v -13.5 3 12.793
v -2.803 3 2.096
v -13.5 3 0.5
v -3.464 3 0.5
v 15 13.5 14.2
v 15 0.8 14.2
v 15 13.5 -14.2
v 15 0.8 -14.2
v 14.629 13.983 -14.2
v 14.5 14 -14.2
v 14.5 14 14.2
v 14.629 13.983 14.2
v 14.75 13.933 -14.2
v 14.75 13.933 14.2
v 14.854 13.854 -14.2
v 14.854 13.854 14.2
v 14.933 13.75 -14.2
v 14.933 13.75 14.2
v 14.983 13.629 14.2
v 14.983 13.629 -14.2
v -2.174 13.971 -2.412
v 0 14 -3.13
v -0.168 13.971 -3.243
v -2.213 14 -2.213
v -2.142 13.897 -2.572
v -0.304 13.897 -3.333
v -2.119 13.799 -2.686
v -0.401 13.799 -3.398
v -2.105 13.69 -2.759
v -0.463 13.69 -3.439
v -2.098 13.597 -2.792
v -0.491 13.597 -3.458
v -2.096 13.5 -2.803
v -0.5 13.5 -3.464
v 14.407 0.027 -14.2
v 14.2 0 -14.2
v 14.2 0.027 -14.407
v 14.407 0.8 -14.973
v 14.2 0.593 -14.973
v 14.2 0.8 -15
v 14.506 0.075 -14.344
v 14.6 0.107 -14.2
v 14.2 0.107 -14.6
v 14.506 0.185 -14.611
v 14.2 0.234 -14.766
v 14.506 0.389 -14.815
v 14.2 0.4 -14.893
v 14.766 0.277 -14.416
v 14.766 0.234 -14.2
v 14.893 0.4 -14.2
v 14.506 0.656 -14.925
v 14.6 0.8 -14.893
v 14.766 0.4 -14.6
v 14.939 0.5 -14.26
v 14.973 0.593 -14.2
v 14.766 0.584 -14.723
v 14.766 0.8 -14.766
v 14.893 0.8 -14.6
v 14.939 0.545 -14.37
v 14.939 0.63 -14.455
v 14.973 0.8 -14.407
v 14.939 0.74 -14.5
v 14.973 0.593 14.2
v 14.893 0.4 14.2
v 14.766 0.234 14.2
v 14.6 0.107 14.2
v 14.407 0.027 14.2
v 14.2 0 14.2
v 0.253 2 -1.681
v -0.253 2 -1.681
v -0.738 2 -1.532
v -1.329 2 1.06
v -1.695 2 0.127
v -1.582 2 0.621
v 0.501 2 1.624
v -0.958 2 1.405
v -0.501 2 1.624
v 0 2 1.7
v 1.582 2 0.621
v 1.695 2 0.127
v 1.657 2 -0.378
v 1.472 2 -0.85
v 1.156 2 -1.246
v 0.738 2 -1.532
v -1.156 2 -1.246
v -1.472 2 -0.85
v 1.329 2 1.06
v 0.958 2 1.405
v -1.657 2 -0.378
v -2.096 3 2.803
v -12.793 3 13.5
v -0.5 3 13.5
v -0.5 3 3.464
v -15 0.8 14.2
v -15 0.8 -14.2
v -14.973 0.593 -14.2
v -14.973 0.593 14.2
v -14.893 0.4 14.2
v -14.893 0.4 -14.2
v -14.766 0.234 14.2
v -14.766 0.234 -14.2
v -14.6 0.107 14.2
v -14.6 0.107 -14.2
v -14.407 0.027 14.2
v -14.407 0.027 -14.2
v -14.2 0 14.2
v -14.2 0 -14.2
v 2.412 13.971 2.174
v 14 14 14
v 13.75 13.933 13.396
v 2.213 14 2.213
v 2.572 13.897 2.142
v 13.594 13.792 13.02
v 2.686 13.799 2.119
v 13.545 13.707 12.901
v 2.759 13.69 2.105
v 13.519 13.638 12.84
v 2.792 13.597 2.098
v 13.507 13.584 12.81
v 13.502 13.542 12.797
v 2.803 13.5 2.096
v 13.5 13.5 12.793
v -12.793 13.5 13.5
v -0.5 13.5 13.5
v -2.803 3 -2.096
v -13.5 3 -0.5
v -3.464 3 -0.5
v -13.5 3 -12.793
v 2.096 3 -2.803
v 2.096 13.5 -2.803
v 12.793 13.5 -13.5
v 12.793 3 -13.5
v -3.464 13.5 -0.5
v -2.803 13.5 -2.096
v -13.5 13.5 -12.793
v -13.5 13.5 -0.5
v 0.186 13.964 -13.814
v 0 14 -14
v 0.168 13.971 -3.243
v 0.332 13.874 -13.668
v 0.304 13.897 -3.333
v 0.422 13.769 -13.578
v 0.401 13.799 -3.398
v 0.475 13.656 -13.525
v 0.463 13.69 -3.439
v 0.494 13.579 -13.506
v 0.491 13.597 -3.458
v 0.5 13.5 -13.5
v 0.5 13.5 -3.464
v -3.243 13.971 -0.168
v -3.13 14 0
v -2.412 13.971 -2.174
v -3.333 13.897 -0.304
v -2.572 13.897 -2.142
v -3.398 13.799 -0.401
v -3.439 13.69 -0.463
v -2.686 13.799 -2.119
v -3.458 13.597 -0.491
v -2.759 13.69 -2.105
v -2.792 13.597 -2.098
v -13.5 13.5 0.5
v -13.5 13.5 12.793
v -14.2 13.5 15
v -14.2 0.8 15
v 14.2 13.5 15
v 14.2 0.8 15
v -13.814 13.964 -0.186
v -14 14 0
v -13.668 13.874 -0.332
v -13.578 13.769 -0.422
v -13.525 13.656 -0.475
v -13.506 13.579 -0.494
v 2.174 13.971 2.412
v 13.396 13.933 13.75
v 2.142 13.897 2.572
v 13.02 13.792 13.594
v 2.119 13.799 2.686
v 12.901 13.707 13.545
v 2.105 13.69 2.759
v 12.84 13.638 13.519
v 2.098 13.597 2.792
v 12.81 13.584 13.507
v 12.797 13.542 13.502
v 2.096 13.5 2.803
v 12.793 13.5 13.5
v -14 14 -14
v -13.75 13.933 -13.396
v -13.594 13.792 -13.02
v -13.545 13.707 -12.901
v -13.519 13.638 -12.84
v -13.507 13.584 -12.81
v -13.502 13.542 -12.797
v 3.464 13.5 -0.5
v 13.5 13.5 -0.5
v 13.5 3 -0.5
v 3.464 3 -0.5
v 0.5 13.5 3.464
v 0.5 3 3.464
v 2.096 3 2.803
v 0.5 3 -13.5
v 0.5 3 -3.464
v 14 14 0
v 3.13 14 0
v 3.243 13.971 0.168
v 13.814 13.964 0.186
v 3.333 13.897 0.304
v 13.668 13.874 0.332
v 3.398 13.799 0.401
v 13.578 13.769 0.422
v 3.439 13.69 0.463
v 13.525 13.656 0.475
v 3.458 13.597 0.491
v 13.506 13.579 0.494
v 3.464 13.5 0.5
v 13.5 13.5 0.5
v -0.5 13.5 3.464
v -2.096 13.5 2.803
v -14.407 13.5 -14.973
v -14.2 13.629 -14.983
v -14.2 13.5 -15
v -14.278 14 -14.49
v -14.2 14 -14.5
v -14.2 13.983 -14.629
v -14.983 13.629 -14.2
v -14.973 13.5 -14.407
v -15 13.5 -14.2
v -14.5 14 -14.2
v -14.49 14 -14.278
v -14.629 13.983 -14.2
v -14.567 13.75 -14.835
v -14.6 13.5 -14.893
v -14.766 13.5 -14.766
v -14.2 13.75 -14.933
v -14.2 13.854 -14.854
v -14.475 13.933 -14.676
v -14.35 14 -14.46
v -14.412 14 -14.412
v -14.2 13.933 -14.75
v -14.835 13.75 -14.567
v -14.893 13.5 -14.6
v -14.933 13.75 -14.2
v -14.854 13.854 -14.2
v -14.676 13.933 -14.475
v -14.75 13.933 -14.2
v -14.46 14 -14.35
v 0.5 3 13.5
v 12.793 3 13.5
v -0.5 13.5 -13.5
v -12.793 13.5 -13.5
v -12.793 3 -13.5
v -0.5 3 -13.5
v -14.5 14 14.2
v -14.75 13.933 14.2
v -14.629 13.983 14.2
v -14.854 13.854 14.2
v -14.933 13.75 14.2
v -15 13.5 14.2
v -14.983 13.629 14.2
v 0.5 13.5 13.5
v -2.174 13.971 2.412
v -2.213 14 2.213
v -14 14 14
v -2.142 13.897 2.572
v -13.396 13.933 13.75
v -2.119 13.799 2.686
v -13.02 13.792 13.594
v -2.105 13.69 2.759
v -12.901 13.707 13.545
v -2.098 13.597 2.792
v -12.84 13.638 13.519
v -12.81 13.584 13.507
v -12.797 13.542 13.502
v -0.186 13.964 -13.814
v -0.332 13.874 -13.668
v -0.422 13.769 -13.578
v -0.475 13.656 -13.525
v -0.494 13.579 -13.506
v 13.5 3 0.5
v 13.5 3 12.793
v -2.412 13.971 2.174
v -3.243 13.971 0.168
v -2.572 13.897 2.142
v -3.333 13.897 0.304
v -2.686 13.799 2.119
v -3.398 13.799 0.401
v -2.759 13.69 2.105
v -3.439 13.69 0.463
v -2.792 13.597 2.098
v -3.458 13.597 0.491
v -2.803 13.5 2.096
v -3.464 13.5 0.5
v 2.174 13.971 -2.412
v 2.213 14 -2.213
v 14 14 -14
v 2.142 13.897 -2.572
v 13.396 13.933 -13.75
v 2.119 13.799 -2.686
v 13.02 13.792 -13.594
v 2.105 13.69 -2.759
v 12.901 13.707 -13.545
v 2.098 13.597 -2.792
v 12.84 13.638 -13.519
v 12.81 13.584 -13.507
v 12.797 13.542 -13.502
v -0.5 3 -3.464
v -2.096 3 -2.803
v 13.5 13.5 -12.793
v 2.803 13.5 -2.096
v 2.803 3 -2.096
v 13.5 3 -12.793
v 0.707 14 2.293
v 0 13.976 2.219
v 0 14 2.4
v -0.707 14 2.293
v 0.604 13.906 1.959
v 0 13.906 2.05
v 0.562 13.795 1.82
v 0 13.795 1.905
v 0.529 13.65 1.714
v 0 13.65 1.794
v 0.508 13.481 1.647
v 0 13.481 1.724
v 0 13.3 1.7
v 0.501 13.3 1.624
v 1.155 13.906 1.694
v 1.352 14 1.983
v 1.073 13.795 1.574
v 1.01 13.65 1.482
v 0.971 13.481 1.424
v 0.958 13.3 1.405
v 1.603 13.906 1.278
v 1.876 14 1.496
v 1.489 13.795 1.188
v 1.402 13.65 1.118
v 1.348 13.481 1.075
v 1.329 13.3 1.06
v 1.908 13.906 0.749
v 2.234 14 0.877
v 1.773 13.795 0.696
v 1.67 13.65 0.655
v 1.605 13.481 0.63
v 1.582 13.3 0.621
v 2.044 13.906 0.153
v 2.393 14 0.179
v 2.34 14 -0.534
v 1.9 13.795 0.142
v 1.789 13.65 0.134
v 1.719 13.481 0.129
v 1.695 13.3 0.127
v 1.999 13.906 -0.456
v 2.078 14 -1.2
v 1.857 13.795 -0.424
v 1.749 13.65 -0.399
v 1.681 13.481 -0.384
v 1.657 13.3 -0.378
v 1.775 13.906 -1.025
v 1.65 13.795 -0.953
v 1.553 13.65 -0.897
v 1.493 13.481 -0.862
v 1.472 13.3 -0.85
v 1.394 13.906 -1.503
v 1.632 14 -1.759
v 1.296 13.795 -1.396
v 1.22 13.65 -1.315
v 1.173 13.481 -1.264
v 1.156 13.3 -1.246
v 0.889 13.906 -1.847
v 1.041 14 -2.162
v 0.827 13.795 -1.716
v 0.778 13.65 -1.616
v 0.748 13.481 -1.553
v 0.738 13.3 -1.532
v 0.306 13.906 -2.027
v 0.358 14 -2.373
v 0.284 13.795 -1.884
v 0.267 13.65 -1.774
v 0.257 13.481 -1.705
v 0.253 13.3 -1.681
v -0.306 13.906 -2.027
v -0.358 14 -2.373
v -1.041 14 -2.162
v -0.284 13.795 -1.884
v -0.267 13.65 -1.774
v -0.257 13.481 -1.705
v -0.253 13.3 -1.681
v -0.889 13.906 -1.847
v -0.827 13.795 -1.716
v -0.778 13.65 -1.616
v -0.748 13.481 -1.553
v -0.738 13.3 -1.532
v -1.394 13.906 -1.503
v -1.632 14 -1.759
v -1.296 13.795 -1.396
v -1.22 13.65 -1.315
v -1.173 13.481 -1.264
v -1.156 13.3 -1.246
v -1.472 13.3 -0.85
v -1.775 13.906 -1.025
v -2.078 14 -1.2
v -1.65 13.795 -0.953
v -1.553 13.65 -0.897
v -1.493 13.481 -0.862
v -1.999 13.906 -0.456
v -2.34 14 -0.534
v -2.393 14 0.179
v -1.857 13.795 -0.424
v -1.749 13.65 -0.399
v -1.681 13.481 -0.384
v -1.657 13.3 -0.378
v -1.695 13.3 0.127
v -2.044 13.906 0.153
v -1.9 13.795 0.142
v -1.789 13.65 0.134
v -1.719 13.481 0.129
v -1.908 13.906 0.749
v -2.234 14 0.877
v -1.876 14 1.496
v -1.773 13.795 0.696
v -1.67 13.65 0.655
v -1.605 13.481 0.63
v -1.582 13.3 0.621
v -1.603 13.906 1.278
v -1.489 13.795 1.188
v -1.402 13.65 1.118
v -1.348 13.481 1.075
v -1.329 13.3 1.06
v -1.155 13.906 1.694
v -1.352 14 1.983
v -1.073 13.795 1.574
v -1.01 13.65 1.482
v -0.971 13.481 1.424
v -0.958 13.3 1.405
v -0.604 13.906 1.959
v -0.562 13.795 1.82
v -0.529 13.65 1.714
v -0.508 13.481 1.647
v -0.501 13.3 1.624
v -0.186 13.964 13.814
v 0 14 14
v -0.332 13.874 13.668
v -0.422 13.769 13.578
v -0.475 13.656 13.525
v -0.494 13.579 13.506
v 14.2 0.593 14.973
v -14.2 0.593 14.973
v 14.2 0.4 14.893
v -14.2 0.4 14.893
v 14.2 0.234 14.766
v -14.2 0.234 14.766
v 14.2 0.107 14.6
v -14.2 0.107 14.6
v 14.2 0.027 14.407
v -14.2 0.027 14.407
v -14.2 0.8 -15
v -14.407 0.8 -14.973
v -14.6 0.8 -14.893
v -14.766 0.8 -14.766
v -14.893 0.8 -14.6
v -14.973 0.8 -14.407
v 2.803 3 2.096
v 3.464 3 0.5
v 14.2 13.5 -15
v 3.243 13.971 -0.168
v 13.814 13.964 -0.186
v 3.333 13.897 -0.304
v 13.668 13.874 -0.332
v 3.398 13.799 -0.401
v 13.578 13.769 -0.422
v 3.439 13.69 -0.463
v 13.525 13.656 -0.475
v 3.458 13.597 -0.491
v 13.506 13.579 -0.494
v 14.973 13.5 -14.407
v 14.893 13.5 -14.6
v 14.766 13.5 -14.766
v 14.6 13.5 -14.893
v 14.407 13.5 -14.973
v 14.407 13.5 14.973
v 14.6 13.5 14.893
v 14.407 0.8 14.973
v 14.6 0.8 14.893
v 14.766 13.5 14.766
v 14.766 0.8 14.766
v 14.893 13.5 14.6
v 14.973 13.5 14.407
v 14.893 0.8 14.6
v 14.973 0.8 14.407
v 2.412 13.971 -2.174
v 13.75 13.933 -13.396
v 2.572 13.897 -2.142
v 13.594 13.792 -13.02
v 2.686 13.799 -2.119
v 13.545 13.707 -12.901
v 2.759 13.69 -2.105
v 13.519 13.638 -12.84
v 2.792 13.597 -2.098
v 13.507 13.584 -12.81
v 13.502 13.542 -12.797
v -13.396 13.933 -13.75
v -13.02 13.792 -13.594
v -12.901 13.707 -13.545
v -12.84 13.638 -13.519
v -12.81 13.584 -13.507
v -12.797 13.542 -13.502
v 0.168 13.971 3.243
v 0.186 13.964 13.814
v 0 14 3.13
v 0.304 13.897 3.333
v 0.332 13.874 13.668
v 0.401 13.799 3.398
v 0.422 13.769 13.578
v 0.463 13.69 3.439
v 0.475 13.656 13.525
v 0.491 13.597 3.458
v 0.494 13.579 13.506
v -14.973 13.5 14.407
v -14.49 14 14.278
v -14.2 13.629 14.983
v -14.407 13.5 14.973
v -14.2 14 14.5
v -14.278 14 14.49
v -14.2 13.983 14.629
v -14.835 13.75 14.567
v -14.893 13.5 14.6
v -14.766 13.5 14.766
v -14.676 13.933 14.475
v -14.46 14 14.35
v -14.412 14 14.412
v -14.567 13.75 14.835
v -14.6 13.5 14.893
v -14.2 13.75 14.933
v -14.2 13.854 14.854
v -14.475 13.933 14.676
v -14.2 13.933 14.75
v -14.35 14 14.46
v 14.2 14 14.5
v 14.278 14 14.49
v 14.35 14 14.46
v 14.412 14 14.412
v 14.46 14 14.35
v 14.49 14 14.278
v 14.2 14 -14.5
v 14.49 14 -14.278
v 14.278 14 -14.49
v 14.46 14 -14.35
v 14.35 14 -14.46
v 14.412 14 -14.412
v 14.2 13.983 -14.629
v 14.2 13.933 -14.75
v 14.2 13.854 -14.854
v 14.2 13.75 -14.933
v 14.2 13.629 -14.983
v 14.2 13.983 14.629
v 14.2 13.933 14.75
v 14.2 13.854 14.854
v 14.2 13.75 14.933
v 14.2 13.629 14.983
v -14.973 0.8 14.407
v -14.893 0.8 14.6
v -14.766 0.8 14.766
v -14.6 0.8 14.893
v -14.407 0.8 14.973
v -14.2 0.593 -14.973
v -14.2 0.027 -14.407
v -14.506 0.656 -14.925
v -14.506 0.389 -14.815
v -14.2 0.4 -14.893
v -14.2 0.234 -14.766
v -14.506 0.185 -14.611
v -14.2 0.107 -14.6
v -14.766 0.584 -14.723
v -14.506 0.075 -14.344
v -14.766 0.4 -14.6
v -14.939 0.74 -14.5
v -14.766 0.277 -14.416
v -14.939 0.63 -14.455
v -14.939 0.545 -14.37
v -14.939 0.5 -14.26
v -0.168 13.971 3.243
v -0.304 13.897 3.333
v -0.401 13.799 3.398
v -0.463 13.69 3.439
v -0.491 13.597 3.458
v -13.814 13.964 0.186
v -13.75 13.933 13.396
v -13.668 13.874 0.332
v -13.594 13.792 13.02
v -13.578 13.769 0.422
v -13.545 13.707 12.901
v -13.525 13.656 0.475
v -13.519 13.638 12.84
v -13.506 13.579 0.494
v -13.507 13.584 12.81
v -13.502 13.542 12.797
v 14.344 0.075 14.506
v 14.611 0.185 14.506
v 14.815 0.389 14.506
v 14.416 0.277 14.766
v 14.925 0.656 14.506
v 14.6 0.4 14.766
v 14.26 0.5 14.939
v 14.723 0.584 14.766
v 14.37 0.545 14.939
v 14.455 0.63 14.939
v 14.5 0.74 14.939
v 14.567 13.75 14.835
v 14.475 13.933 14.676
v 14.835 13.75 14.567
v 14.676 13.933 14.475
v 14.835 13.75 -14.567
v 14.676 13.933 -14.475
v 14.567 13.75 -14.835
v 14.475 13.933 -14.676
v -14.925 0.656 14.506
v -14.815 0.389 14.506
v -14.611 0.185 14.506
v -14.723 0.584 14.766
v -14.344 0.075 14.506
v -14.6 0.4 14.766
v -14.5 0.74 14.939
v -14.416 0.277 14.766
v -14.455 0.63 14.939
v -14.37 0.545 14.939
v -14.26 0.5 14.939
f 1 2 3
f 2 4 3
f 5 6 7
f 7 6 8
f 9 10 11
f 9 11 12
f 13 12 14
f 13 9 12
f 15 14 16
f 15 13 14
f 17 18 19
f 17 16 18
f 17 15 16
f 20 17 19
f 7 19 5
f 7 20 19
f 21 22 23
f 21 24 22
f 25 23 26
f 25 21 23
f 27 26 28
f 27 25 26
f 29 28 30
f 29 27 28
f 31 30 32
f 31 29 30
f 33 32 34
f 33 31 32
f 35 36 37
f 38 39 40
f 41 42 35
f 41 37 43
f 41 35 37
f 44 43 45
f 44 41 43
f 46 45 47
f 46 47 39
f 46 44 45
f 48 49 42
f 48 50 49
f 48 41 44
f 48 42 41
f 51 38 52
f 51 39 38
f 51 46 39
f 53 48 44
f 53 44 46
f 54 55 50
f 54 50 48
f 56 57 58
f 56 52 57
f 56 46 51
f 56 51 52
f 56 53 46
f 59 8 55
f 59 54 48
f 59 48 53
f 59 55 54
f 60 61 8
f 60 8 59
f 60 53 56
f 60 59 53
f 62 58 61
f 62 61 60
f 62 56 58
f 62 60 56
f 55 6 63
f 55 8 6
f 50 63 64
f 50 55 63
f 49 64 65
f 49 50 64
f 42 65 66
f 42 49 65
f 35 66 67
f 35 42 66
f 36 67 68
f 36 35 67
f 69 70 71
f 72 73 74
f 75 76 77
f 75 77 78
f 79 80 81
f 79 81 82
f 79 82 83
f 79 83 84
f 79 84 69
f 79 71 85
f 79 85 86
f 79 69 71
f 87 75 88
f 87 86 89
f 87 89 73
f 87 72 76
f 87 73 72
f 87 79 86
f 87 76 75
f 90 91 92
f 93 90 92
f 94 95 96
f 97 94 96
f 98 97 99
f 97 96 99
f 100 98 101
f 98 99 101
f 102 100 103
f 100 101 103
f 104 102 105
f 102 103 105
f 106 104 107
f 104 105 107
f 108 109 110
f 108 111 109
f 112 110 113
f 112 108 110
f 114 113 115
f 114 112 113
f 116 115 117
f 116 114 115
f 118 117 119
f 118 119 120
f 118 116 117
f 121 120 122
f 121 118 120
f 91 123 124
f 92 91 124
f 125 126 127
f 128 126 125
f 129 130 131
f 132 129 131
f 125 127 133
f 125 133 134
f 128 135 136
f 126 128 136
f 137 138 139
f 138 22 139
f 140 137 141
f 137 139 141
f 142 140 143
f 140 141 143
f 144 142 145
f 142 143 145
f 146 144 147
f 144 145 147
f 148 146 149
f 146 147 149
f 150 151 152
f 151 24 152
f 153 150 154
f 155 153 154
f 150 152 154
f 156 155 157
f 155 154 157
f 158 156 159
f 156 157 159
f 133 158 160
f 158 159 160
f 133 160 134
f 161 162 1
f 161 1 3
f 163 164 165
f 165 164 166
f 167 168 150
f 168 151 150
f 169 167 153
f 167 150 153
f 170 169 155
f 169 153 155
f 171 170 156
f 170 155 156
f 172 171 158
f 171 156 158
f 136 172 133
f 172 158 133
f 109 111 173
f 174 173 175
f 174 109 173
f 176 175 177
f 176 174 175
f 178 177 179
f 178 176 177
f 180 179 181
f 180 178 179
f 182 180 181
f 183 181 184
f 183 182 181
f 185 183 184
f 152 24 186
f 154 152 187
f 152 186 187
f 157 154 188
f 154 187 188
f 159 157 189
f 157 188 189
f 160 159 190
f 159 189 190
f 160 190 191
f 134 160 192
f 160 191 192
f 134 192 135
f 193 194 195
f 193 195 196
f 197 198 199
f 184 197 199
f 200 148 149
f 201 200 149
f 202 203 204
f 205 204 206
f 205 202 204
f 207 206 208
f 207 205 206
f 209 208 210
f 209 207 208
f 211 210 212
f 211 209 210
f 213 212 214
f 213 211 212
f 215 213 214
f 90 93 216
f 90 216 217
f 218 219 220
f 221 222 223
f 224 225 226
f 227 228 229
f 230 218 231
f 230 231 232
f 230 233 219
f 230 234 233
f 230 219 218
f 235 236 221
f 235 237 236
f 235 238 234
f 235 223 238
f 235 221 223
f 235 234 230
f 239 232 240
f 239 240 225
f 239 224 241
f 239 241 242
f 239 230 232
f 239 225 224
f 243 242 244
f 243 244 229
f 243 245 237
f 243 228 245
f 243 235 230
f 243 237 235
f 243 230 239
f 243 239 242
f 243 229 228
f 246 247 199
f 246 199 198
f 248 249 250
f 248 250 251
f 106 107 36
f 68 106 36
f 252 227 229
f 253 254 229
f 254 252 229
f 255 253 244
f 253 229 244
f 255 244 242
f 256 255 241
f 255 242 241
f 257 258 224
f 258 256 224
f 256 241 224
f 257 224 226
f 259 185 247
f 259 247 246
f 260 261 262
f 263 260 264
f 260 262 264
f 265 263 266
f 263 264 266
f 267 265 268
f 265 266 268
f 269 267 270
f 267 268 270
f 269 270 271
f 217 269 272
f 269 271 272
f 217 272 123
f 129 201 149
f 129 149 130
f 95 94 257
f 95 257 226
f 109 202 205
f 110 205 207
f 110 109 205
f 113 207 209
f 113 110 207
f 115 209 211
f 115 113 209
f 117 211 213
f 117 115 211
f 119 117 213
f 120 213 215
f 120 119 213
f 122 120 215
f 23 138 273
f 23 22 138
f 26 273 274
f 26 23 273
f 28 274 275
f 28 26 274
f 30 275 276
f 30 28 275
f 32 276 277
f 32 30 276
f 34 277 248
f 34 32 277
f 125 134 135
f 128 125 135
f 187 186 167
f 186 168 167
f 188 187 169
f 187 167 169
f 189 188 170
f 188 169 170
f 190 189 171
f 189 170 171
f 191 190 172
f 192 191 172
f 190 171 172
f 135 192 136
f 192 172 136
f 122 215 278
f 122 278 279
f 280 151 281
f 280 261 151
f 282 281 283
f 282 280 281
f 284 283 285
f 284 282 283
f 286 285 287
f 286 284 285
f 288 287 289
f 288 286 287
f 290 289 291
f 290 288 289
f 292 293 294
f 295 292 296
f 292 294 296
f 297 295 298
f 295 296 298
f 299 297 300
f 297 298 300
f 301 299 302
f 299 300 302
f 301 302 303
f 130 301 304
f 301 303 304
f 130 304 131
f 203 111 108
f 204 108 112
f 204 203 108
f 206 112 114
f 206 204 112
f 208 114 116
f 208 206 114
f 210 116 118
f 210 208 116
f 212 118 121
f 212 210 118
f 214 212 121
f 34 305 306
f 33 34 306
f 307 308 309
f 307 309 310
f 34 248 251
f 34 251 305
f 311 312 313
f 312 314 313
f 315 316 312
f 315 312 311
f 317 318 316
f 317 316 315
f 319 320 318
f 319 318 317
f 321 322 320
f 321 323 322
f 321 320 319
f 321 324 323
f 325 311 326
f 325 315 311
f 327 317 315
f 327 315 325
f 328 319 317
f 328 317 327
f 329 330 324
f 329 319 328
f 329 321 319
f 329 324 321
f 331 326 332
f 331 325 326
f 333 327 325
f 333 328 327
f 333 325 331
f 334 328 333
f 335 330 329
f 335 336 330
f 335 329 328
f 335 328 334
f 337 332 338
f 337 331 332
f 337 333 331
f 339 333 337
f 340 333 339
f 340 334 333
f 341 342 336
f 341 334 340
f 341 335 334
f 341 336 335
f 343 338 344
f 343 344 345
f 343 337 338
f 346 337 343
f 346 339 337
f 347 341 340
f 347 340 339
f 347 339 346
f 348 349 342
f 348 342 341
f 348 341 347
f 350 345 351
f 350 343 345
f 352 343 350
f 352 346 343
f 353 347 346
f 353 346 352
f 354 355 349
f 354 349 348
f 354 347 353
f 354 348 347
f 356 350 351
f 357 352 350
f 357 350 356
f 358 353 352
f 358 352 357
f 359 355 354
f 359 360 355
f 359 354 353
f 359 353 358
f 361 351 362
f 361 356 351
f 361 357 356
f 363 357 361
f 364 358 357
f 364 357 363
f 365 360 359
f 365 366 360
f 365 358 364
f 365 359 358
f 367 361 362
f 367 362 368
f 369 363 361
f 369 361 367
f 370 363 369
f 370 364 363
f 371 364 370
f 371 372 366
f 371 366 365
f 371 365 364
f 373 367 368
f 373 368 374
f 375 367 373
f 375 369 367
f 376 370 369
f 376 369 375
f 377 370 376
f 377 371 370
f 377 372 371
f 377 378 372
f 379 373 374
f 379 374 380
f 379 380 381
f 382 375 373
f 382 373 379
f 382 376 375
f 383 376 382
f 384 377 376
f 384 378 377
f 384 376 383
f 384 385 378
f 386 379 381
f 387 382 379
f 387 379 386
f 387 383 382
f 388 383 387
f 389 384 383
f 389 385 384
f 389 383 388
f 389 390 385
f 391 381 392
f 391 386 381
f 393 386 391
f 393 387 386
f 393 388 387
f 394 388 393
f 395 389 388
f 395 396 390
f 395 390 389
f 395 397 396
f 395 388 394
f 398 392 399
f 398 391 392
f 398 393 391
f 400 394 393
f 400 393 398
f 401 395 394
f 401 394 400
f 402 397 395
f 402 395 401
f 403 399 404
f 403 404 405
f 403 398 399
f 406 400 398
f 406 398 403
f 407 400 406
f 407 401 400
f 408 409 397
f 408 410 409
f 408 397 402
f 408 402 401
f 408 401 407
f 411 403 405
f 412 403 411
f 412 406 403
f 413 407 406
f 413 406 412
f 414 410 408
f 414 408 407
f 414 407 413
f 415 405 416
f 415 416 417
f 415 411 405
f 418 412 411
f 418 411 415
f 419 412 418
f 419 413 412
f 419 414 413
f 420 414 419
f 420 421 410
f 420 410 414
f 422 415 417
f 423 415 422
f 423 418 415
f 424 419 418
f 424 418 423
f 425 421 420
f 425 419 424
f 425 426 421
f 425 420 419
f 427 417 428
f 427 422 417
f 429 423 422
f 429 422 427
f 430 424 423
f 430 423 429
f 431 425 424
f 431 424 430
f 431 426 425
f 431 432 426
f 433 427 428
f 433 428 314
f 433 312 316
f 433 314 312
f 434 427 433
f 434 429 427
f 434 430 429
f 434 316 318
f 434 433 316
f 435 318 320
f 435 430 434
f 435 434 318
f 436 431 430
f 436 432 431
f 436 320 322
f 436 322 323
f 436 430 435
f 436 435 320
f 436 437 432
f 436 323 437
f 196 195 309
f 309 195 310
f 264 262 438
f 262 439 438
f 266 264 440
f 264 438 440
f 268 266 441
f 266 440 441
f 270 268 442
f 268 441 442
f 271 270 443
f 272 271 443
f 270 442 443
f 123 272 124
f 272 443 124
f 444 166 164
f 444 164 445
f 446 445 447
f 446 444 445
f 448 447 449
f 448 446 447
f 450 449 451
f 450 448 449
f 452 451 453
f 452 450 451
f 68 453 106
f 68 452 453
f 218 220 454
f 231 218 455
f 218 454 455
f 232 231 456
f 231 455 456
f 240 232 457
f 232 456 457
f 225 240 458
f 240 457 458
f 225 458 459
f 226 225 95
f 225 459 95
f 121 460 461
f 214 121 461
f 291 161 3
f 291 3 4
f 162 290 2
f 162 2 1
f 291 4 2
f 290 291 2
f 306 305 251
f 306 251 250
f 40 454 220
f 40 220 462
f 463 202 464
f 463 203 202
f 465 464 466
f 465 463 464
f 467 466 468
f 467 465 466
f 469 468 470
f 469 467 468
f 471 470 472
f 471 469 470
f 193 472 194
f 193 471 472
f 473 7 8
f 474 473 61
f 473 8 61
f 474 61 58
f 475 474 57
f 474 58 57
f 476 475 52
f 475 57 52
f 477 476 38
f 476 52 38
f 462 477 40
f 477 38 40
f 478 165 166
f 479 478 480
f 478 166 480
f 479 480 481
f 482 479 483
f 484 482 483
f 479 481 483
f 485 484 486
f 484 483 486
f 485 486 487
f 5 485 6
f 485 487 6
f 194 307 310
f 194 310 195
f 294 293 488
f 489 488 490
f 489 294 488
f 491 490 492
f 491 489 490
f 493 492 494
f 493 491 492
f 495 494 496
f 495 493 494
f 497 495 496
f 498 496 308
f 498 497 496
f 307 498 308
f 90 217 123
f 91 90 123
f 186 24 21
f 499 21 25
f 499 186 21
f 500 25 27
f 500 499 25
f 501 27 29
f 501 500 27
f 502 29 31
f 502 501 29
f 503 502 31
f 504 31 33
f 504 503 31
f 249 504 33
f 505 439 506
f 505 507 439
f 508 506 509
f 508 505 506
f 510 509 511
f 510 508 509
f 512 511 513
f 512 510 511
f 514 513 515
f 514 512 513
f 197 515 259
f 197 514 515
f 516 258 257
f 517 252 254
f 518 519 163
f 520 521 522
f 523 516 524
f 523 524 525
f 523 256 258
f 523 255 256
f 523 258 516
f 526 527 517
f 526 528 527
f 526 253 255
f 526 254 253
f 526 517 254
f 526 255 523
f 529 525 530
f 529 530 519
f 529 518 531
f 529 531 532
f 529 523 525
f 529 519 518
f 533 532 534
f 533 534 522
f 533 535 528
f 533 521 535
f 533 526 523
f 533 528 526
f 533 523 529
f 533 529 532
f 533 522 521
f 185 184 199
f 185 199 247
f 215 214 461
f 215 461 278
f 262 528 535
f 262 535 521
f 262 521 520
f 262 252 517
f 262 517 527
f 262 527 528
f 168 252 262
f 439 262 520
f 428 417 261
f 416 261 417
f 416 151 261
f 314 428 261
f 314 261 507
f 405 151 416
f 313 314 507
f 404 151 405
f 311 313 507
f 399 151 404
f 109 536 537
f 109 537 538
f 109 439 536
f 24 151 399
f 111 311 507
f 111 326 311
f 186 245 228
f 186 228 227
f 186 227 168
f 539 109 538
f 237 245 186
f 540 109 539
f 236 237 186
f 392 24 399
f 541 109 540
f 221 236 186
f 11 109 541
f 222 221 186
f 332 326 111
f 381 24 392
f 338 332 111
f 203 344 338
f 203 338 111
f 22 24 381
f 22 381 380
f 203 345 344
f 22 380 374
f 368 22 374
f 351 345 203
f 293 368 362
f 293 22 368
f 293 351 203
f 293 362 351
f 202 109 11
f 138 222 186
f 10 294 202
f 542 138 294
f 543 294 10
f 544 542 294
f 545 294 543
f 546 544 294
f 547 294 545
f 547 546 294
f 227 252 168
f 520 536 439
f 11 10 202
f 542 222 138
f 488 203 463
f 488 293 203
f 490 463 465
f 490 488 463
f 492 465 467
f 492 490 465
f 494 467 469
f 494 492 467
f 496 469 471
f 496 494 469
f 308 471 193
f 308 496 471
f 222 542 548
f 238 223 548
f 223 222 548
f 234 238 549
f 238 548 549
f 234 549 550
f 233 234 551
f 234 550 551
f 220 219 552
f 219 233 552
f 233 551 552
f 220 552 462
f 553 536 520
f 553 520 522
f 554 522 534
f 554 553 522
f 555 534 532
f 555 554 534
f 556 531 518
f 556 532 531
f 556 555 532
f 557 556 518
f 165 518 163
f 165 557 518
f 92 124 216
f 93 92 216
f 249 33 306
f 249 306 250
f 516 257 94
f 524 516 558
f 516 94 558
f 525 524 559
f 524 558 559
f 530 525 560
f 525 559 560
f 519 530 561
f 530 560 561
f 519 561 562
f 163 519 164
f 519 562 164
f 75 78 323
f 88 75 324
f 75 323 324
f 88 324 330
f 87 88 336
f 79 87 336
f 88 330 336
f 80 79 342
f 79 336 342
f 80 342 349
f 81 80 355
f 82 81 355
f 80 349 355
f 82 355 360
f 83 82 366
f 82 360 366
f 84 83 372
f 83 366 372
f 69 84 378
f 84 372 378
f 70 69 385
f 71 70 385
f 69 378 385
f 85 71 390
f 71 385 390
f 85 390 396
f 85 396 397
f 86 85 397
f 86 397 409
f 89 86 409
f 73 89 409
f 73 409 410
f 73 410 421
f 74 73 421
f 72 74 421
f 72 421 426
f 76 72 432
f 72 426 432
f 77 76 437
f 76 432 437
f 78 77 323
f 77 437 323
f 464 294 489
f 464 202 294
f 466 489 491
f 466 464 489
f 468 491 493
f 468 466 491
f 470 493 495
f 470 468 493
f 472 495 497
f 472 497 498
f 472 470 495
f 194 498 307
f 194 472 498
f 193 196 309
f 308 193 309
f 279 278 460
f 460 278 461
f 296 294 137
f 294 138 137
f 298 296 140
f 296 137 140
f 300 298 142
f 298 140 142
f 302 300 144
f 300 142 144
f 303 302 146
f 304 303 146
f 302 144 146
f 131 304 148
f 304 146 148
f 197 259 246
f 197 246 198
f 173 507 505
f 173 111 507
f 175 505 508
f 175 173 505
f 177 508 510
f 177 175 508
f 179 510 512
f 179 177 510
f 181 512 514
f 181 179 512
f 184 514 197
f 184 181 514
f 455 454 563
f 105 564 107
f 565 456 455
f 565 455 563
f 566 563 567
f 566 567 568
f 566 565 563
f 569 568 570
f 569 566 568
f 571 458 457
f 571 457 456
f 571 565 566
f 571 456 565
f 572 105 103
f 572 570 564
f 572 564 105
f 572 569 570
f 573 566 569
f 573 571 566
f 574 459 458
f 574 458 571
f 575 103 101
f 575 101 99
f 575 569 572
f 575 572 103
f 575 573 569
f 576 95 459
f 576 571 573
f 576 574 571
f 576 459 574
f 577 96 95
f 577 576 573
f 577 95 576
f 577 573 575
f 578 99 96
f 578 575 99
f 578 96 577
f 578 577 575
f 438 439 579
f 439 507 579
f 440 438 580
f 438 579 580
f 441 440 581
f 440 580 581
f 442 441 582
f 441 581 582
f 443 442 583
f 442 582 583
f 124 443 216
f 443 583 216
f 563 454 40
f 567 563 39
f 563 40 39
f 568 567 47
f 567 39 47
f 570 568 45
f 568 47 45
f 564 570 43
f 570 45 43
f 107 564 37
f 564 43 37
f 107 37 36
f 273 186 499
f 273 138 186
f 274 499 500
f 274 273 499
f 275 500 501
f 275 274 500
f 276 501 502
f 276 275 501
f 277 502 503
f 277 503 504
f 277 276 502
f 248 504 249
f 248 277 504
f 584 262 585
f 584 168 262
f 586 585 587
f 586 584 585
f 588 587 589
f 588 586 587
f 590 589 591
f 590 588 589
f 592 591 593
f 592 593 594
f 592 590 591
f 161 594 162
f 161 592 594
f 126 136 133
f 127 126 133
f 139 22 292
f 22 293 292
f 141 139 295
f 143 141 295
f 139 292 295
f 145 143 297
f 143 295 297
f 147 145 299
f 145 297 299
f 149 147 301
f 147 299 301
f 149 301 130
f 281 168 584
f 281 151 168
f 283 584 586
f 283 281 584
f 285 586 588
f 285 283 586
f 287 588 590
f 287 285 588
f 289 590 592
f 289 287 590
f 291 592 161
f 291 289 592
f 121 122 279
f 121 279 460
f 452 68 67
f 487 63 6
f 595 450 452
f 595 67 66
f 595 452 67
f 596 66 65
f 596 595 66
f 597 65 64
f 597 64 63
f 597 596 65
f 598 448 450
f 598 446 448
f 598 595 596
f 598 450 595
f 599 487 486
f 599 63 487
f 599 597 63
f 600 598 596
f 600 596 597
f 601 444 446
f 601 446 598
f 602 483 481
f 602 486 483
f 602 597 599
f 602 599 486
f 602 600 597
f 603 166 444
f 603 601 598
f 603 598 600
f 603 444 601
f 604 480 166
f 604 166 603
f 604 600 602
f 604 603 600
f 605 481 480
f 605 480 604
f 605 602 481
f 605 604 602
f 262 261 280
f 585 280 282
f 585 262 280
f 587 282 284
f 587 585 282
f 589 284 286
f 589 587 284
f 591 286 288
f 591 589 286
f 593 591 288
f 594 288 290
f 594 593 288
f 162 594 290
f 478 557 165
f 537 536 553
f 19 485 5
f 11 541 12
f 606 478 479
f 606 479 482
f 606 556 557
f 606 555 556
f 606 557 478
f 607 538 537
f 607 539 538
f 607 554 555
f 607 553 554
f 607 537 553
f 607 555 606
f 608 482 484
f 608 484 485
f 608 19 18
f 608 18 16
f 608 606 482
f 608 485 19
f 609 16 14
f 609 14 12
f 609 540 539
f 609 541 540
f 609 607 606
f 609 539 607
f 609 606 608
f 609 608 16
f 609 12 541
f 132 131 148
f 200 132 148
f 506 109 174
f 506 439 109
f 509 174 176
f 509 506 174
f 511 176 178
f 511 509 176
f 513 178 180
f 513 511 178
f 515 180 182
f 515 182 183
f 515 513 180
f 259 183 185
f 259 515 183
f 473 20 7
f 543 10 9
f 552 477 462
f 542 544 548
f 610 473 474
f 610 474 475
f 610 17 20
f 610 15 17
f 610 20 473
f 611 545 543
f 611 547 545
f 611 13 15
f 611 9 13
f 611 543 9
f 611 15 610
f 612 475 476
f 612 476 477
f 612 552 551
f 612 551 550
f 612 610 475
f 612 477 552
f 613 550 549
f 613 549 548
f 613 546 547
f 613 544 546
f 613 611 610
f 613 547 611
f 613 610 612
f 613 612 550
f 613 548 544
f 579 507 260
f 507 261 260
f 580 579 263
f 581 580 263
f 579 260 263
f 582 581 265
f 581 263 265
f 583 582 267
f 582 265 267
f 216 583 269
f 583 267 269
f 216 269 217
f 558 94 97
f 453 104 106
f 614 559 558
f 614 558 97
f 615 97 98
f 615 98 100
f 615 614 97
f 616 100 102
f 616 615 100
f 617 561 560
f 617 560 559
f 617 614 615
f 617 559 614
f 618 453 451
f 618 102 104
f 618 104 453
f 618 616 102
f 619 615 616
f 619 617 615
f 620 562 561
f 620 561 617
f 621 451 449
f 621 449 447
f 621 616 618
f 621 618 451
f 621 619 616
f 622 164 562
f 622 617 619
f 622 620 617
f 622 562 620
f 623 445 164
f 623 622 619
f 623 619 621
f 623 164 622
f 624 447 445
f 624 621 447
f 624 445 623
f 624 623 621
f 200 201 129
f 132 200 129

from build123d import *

# Parameters (mm, degrees)
SKETCH1_W           = 30
SKETCH1_H           = 30
BOSS_EXTRUDE1_DEPTH = 14
SKETCH2_R           = 1.7
CUT_EXTRUDE1_DEPTH  = 12
CUT_EXTRUDE2_DEPTH  = 11
FILLET1_R           = 0.7
FILLET2_R           = 0.5
FILLET3_R           = 0.8
FILLET4_R           = 0.8


# Some blends are built 0.0001 mm under size
with BuildPart() as part:
    # Sketch1 → Boss-Extrude1 (new body)
    with BuildSketch(Plane(origin=(0, 0, 0), x_dir=(1, 0, 0), z_dir=(0, 1, 0))):
        Rectangle(SKETCH1_W, SKETCH1_H)
    extrude(amount=BOSS_EXTRUDE1_DEPTH)

    # Sketch2 → Cut-Extrude1 (cut)
    with BuildSketch(Plane(origin=(0, 14, 0), x_dir=(1, 0, 0), z_dir=(0, 1, 0))):
        with Locations(Location((0, 0, 0), (0, 0, 270))):
            Circle(SKETCH2_R)
    extrude(amount=-CUT_EXTRUDE1_DEPTH, mode=Mode.SUBTRACT)

    # Sketch3 → Cut-Extrude2 (cut)
    with BuildSketch(Plane(origin=(0, 14, 0), x_dir=(1, 0, 0), z_dir=(0, 1, 0))):
        Polygon((2.095936352, 2.803043133), (12.792893219, 13.5), (0.5, 13.5), (0.5, 3.464101615), align=None)
        Polygon((2.803043133, 2.095936352), (13.5, 12.792893219), (13.5, 0.5), (3.464101615, 0.5), align=None)
        Polygon((3.464101615, -0.5), (13.5, -0.5), (13.5, -12.792893219), (2.803043133, -2.095936352), align=None)
        Polygon((2.095936352, -2.803043133), (12.792893219, -13.5), (0.5, -13.5), (0.5, -3.464101615), align=None)
        Polygon((-2.095936352, -2.803043133), (-12.792893219, -13.5), (-0.5, -13.5), (-0.5, -3.464101615), align=None)
        Polygon((-2.803043133, -2.095936352), (-13.5, -12.792893219), (-13.5, -0.5), (-3.464101615, -0.5), align=None)
        Polygon((-2.803043133, 2.095936352), (-13.5, 12.792893219), (-13.5, 0.5), (-3.464101615, 0.5), align=None)
        Polygon((-2.095936352, 2.803043133), (-12.792893219, 13.5), (-0.5, 13.5), (-0.5, 3.464101615), align=None)
    extrude(amount=-CUT_EXTRUDE2_DEPTH, mode=Mode.SUBTRACT)

    # Fillet1
    fillet1_edges = [part.edges().sort_by_distance(p)[0] for p in [
        (0, 14, -1.7),
    ]]
    fillet(fillet1_edges, radius=FILLET1_R)

    # Fillet2
    fillet2_edges = [part.edges().sort_by_distance(p)[0] for p in [
        (0, 14, 15),
        (15, 14, 0),
        (8.482050808, 14, -0.5),
        (13.5, 14, -6.646446609),
        (8.151521567, 14, -7.444414786),
        (3.133572374, 14, -1.297968176),
        (-0.5, 14, 8.482050808),
        (-1.297968176, 14, 3.133572374),
        (-7.444414785, 14, 8.151521567),
        (-6.646446609, 14, 13.5),
        (0.5, 14, -8.482050808),
        (1.297968176, 14, -3.133572374),
        (7.444414786, 14, -8.151521567),
        (6.646446609, 14, -13.5),
        (0, 14, -15),
        (0.5, 14, 8.482050808),
        (6.646446609, 14, 13.5),
        (7.444414786, 14, 8.151521567),
        (1.297968176, 14, 3.133572374),
        (-8.482050808, 14, 0.5),
        (-13.5, 14, 6.646446609),
        (-8.151521567, 14, 7.444414786),
        (-3.133572374, 14, 1.297968176),
        (-8.482050808, 14, -0.5),
        (-3.133572374, 14, -1.297968176),
        (-8.151521567, 14, -7.444414786),
        (-13.5, 14, -6.646446609),
        (13.5, 14, 6.646446609),
        (8.482050808, 14, 0.5),
        (3.133572374, 14, 1.297968176),
        (8.151521567, 14, 7.444414786),
        (-0.5, 14, -8.482050808),
        (-6.646446609, 14, -13.5),
        (-7.444414786, 14, -8.151521567),
        (-1.297968176, 14, -3.133572374),
        (-15, 14, 0),
    ]]
    fillet(fillet2_edges, radius=FILLET2_R - 0.0001)  # a hair under: the kernel refuses the full size

    # Fillet3
    fillet3_edges = [part.edges().sort_by_distance(p)[0] for p in [
        (15, 0, 0),
        (0, 0, 15),
        (-15, 0, 0),
        (0, 0, -15),
    ]]
    fillet(fillet3_edges, radius=FILLET3_R)

    # Fillet4
    # the kernel refuses this fillet: 0.8 mm, written as the material it takes off along each edge
    with BuildSketch(Plane(origin=(-14.2, 14, 14.2), x_dir=(-1, 0, 0), z_dir=(0, 0, -1))) as fillet4_piece_1:
        with BuildLine():
            CenterArc((0.3001, -0.4999), 0.4999, 0, 90)
            Line((0.8, -0.4999), (0.8, 0))
            Line((0.8, 0), (0.3001, 0))
        make_face()
    revolve(axis=Axis((-14.2, 14, 14.2), (0, 1, 0)), revolution_arc=90, mode=Mode.SUBTRACT)
    with BuildSketch(Plane(origin=(-14.2, 14, -14.2), x_dir=(0, 0, -1), z_dir=(1, 0, 0))) as fillet4_piece_2:
        with BuildLine():
            CenterArc((0.3001, -0.4999), 0.4999, 0, 90)
            Line((0.8, -0.4999), (0.8, 0))
            Line((0.8, 0), (0.3001, 0))
        make_face()
    revolve(axis=Axis((-14.2, 14, -14.2), (0, 1, 0)), revolution_arc=90, mode=Mode.SUBTRACT)
    with BuildSketch(Plane(origin=(14.2, 14, 14.2), x_dir=(0, 0, 1), z_dir=(-1, 0, 0))) as fillet4_piece_3:
        with BuildLine():
            CenterArc((0.3001, -0.4999), 0.4999, 0, 90)
            Line((0.8, -0.4999), (0.8, 0))
            Line((0.8, 0), (0.3001, 0))
        make_face()
    revolve(axis=Axis((14.2, 14, 14.2), (0, 1, 0)), revolution_arc=90, mode=Mode.SUBTRACT)
    with BuildSketch(Plane(origin=(14.2, 14, -14.2), x_dir=(1, 0, 0), z_dir=(0, 0, 1))) as fillet4_piece_4:
        with BuildLine():
            CenterArc((0.3001, -0.4999), 0.4999, 0, 90)
            Line((0.8, -0.4999), (0.8, 0))
            Line((0.8, 0), (0.3001, 0))
        make_face()
    revolve(axis=Axis((14.2, 14, -14.2), (0, 1, 0)), revolution_arc=90, mode=Mode.SUBTRACT)
    with BuildSketch(Plane(origin=(14.2, 0.8, 14.2), x_dir=(1, 0, 0), z_dir=(0, 0, 1))) as fillet4_piece_5_section:
        Polygon((0, 0), (FILLET4_R, 0), (FILLET4_R, -FILLET4_R), (0, -FILLET4_R), align=None)
    fillet4_piece_5 = extrude(amount=FILLET4_R, mode=Mode.PRIVATE)
    fillet4_piece_5 = fillet4_piece_5 - Plane(origin=(14.2, 0.8, 14.2), x_dir=(-0.7071067811865475, 0.7071067811865475, 0), z_dir=(0, 0, 1)) * Sphere(FILLET4_R, mode=Mode.PRIVATE)
    add(fillet4_piece_5, mode=Mode.SUBTRACT)
    with BuildSketch(Plane(origin=(14.2, 0.8, -14.2), x_dir=(0, 0, -1), z_dir=(1, 0, 0))) as fillet4_piece_6_section:
        Polygon((0, 0), (FILLET4_R, 0), (FILLET4_R, -FILLET4_R), (0, -FILLET4_R), align=None)
    fillet4_piece_6 = extrude(amount=FILLET4_R, mode=Mode.PRIVATE)
    fillet4_piece_6 = fillet4_piece_6 - Plane(origin=(14.2, 0.8, -14.2), x_dir=(0, 0.7071067811865475, 0.7071067811865475), z_dir=(1, 0, 0)) * Sphere(FILLET4_R, mode=Mode.PRIVATE)
    add(fillet4_piece_6, mode=Mode.SUBTRACT)
    with BuildSketch(Plane(origin=(-14.2, 0.8, 14.2), x_dir=(-1, 0, 0), z_dir=(0, 0, 1))) as fillet4_piece_7_section:
        Polygon((0, 0), (FILLET4_R, 0), (FILLET4_R, FILLET4_R), (0, FILLET4_R), align=None)
    fillet4_piece_7 = extrude(amount=FILLET4_R, mode=Mode.PRIVATE)
    fillet4_piece_7 = fillet4_piece_7 - Plane(origin=(-14.2, 0.8, 14.2), x_dir=(0.7071067811865475, 0.7071067811865475, 0), z_dir=(0, 0, 1)) * Sphere(FILLET4_R, mode=Mode.PRIVATE)
    add(fillet4_piece_7, mode=Mode.SUBTRACT)
    with BuildSketch(Plane(origin=(-14.2, 0.8, -14.2), x_dir=(0, 0, -1), z_dir=(-1, 0, 0))) as fillet4_piece_8_section:
        Polygon((0, 0), (FILLET4_R, 0), (FILLET4_R, FILLET4_R), (0, FILLET4_R), align=None)
    fillet4_piece_8 = extrude(amount=FILLET4_R, mode=Mode.PRIVATE)
    fillet4_piece_8 = fillet4_piece_8 - Plane(origin=(-14.2, 0.8, -14.2), x_dir=(0, 0.7071067811865475, 0.7071067811865475), z_dir=(-1, 0, 0)) * Sphere(FILLET4_R, mode=Mode.PRIVATE)
    add(fillet4_piece_8, mode=Mode.SUBTRACT)
    with BuildSketch(Plane(origin=(15, 0.8, -15), x_dir=(0, 0, 1), z_dir=(0, 1, 0)), Plane(origin=(15, 0.8, 15), x_dir=(-1, 0, 0), z_dir=(0, 1, 0))) as fillet4_piece_9:
        with BuildLine():
            CenterArc((FILLET4_R, -FILLET4_R), FILLET4_R, 90, 90)
            Line((0, -FILLET4_R), (0, 0))
            Line((0, 0), (FILLET4_R, 0))
        make_face()
    extrude(amount=13.2, mode=Mode.SUBTRACT)
    with BuildSketch(Plane(origin=(-15, 0.8, 15), x_dir=(1, 0, 0), z_dir=(0, 1, 0)), Plane(origin=(-15, 0.8, -15), x_dir=(0, 0, 1), z_dir=(0, 1, 0))) as fillet4_piece_10:
        with BuildLine():
            CenterArc((FILLET4_R, FILLET4_R), FILLET4_R, 180, 90)
            Line((0, FILLET4_R), (0, 0))
            Line((0, 0), (FILLET4_R, 0))
        make_face()
    extrude(amount=13.2, mode=Mode.SUBTRACT)


solid = part.part
